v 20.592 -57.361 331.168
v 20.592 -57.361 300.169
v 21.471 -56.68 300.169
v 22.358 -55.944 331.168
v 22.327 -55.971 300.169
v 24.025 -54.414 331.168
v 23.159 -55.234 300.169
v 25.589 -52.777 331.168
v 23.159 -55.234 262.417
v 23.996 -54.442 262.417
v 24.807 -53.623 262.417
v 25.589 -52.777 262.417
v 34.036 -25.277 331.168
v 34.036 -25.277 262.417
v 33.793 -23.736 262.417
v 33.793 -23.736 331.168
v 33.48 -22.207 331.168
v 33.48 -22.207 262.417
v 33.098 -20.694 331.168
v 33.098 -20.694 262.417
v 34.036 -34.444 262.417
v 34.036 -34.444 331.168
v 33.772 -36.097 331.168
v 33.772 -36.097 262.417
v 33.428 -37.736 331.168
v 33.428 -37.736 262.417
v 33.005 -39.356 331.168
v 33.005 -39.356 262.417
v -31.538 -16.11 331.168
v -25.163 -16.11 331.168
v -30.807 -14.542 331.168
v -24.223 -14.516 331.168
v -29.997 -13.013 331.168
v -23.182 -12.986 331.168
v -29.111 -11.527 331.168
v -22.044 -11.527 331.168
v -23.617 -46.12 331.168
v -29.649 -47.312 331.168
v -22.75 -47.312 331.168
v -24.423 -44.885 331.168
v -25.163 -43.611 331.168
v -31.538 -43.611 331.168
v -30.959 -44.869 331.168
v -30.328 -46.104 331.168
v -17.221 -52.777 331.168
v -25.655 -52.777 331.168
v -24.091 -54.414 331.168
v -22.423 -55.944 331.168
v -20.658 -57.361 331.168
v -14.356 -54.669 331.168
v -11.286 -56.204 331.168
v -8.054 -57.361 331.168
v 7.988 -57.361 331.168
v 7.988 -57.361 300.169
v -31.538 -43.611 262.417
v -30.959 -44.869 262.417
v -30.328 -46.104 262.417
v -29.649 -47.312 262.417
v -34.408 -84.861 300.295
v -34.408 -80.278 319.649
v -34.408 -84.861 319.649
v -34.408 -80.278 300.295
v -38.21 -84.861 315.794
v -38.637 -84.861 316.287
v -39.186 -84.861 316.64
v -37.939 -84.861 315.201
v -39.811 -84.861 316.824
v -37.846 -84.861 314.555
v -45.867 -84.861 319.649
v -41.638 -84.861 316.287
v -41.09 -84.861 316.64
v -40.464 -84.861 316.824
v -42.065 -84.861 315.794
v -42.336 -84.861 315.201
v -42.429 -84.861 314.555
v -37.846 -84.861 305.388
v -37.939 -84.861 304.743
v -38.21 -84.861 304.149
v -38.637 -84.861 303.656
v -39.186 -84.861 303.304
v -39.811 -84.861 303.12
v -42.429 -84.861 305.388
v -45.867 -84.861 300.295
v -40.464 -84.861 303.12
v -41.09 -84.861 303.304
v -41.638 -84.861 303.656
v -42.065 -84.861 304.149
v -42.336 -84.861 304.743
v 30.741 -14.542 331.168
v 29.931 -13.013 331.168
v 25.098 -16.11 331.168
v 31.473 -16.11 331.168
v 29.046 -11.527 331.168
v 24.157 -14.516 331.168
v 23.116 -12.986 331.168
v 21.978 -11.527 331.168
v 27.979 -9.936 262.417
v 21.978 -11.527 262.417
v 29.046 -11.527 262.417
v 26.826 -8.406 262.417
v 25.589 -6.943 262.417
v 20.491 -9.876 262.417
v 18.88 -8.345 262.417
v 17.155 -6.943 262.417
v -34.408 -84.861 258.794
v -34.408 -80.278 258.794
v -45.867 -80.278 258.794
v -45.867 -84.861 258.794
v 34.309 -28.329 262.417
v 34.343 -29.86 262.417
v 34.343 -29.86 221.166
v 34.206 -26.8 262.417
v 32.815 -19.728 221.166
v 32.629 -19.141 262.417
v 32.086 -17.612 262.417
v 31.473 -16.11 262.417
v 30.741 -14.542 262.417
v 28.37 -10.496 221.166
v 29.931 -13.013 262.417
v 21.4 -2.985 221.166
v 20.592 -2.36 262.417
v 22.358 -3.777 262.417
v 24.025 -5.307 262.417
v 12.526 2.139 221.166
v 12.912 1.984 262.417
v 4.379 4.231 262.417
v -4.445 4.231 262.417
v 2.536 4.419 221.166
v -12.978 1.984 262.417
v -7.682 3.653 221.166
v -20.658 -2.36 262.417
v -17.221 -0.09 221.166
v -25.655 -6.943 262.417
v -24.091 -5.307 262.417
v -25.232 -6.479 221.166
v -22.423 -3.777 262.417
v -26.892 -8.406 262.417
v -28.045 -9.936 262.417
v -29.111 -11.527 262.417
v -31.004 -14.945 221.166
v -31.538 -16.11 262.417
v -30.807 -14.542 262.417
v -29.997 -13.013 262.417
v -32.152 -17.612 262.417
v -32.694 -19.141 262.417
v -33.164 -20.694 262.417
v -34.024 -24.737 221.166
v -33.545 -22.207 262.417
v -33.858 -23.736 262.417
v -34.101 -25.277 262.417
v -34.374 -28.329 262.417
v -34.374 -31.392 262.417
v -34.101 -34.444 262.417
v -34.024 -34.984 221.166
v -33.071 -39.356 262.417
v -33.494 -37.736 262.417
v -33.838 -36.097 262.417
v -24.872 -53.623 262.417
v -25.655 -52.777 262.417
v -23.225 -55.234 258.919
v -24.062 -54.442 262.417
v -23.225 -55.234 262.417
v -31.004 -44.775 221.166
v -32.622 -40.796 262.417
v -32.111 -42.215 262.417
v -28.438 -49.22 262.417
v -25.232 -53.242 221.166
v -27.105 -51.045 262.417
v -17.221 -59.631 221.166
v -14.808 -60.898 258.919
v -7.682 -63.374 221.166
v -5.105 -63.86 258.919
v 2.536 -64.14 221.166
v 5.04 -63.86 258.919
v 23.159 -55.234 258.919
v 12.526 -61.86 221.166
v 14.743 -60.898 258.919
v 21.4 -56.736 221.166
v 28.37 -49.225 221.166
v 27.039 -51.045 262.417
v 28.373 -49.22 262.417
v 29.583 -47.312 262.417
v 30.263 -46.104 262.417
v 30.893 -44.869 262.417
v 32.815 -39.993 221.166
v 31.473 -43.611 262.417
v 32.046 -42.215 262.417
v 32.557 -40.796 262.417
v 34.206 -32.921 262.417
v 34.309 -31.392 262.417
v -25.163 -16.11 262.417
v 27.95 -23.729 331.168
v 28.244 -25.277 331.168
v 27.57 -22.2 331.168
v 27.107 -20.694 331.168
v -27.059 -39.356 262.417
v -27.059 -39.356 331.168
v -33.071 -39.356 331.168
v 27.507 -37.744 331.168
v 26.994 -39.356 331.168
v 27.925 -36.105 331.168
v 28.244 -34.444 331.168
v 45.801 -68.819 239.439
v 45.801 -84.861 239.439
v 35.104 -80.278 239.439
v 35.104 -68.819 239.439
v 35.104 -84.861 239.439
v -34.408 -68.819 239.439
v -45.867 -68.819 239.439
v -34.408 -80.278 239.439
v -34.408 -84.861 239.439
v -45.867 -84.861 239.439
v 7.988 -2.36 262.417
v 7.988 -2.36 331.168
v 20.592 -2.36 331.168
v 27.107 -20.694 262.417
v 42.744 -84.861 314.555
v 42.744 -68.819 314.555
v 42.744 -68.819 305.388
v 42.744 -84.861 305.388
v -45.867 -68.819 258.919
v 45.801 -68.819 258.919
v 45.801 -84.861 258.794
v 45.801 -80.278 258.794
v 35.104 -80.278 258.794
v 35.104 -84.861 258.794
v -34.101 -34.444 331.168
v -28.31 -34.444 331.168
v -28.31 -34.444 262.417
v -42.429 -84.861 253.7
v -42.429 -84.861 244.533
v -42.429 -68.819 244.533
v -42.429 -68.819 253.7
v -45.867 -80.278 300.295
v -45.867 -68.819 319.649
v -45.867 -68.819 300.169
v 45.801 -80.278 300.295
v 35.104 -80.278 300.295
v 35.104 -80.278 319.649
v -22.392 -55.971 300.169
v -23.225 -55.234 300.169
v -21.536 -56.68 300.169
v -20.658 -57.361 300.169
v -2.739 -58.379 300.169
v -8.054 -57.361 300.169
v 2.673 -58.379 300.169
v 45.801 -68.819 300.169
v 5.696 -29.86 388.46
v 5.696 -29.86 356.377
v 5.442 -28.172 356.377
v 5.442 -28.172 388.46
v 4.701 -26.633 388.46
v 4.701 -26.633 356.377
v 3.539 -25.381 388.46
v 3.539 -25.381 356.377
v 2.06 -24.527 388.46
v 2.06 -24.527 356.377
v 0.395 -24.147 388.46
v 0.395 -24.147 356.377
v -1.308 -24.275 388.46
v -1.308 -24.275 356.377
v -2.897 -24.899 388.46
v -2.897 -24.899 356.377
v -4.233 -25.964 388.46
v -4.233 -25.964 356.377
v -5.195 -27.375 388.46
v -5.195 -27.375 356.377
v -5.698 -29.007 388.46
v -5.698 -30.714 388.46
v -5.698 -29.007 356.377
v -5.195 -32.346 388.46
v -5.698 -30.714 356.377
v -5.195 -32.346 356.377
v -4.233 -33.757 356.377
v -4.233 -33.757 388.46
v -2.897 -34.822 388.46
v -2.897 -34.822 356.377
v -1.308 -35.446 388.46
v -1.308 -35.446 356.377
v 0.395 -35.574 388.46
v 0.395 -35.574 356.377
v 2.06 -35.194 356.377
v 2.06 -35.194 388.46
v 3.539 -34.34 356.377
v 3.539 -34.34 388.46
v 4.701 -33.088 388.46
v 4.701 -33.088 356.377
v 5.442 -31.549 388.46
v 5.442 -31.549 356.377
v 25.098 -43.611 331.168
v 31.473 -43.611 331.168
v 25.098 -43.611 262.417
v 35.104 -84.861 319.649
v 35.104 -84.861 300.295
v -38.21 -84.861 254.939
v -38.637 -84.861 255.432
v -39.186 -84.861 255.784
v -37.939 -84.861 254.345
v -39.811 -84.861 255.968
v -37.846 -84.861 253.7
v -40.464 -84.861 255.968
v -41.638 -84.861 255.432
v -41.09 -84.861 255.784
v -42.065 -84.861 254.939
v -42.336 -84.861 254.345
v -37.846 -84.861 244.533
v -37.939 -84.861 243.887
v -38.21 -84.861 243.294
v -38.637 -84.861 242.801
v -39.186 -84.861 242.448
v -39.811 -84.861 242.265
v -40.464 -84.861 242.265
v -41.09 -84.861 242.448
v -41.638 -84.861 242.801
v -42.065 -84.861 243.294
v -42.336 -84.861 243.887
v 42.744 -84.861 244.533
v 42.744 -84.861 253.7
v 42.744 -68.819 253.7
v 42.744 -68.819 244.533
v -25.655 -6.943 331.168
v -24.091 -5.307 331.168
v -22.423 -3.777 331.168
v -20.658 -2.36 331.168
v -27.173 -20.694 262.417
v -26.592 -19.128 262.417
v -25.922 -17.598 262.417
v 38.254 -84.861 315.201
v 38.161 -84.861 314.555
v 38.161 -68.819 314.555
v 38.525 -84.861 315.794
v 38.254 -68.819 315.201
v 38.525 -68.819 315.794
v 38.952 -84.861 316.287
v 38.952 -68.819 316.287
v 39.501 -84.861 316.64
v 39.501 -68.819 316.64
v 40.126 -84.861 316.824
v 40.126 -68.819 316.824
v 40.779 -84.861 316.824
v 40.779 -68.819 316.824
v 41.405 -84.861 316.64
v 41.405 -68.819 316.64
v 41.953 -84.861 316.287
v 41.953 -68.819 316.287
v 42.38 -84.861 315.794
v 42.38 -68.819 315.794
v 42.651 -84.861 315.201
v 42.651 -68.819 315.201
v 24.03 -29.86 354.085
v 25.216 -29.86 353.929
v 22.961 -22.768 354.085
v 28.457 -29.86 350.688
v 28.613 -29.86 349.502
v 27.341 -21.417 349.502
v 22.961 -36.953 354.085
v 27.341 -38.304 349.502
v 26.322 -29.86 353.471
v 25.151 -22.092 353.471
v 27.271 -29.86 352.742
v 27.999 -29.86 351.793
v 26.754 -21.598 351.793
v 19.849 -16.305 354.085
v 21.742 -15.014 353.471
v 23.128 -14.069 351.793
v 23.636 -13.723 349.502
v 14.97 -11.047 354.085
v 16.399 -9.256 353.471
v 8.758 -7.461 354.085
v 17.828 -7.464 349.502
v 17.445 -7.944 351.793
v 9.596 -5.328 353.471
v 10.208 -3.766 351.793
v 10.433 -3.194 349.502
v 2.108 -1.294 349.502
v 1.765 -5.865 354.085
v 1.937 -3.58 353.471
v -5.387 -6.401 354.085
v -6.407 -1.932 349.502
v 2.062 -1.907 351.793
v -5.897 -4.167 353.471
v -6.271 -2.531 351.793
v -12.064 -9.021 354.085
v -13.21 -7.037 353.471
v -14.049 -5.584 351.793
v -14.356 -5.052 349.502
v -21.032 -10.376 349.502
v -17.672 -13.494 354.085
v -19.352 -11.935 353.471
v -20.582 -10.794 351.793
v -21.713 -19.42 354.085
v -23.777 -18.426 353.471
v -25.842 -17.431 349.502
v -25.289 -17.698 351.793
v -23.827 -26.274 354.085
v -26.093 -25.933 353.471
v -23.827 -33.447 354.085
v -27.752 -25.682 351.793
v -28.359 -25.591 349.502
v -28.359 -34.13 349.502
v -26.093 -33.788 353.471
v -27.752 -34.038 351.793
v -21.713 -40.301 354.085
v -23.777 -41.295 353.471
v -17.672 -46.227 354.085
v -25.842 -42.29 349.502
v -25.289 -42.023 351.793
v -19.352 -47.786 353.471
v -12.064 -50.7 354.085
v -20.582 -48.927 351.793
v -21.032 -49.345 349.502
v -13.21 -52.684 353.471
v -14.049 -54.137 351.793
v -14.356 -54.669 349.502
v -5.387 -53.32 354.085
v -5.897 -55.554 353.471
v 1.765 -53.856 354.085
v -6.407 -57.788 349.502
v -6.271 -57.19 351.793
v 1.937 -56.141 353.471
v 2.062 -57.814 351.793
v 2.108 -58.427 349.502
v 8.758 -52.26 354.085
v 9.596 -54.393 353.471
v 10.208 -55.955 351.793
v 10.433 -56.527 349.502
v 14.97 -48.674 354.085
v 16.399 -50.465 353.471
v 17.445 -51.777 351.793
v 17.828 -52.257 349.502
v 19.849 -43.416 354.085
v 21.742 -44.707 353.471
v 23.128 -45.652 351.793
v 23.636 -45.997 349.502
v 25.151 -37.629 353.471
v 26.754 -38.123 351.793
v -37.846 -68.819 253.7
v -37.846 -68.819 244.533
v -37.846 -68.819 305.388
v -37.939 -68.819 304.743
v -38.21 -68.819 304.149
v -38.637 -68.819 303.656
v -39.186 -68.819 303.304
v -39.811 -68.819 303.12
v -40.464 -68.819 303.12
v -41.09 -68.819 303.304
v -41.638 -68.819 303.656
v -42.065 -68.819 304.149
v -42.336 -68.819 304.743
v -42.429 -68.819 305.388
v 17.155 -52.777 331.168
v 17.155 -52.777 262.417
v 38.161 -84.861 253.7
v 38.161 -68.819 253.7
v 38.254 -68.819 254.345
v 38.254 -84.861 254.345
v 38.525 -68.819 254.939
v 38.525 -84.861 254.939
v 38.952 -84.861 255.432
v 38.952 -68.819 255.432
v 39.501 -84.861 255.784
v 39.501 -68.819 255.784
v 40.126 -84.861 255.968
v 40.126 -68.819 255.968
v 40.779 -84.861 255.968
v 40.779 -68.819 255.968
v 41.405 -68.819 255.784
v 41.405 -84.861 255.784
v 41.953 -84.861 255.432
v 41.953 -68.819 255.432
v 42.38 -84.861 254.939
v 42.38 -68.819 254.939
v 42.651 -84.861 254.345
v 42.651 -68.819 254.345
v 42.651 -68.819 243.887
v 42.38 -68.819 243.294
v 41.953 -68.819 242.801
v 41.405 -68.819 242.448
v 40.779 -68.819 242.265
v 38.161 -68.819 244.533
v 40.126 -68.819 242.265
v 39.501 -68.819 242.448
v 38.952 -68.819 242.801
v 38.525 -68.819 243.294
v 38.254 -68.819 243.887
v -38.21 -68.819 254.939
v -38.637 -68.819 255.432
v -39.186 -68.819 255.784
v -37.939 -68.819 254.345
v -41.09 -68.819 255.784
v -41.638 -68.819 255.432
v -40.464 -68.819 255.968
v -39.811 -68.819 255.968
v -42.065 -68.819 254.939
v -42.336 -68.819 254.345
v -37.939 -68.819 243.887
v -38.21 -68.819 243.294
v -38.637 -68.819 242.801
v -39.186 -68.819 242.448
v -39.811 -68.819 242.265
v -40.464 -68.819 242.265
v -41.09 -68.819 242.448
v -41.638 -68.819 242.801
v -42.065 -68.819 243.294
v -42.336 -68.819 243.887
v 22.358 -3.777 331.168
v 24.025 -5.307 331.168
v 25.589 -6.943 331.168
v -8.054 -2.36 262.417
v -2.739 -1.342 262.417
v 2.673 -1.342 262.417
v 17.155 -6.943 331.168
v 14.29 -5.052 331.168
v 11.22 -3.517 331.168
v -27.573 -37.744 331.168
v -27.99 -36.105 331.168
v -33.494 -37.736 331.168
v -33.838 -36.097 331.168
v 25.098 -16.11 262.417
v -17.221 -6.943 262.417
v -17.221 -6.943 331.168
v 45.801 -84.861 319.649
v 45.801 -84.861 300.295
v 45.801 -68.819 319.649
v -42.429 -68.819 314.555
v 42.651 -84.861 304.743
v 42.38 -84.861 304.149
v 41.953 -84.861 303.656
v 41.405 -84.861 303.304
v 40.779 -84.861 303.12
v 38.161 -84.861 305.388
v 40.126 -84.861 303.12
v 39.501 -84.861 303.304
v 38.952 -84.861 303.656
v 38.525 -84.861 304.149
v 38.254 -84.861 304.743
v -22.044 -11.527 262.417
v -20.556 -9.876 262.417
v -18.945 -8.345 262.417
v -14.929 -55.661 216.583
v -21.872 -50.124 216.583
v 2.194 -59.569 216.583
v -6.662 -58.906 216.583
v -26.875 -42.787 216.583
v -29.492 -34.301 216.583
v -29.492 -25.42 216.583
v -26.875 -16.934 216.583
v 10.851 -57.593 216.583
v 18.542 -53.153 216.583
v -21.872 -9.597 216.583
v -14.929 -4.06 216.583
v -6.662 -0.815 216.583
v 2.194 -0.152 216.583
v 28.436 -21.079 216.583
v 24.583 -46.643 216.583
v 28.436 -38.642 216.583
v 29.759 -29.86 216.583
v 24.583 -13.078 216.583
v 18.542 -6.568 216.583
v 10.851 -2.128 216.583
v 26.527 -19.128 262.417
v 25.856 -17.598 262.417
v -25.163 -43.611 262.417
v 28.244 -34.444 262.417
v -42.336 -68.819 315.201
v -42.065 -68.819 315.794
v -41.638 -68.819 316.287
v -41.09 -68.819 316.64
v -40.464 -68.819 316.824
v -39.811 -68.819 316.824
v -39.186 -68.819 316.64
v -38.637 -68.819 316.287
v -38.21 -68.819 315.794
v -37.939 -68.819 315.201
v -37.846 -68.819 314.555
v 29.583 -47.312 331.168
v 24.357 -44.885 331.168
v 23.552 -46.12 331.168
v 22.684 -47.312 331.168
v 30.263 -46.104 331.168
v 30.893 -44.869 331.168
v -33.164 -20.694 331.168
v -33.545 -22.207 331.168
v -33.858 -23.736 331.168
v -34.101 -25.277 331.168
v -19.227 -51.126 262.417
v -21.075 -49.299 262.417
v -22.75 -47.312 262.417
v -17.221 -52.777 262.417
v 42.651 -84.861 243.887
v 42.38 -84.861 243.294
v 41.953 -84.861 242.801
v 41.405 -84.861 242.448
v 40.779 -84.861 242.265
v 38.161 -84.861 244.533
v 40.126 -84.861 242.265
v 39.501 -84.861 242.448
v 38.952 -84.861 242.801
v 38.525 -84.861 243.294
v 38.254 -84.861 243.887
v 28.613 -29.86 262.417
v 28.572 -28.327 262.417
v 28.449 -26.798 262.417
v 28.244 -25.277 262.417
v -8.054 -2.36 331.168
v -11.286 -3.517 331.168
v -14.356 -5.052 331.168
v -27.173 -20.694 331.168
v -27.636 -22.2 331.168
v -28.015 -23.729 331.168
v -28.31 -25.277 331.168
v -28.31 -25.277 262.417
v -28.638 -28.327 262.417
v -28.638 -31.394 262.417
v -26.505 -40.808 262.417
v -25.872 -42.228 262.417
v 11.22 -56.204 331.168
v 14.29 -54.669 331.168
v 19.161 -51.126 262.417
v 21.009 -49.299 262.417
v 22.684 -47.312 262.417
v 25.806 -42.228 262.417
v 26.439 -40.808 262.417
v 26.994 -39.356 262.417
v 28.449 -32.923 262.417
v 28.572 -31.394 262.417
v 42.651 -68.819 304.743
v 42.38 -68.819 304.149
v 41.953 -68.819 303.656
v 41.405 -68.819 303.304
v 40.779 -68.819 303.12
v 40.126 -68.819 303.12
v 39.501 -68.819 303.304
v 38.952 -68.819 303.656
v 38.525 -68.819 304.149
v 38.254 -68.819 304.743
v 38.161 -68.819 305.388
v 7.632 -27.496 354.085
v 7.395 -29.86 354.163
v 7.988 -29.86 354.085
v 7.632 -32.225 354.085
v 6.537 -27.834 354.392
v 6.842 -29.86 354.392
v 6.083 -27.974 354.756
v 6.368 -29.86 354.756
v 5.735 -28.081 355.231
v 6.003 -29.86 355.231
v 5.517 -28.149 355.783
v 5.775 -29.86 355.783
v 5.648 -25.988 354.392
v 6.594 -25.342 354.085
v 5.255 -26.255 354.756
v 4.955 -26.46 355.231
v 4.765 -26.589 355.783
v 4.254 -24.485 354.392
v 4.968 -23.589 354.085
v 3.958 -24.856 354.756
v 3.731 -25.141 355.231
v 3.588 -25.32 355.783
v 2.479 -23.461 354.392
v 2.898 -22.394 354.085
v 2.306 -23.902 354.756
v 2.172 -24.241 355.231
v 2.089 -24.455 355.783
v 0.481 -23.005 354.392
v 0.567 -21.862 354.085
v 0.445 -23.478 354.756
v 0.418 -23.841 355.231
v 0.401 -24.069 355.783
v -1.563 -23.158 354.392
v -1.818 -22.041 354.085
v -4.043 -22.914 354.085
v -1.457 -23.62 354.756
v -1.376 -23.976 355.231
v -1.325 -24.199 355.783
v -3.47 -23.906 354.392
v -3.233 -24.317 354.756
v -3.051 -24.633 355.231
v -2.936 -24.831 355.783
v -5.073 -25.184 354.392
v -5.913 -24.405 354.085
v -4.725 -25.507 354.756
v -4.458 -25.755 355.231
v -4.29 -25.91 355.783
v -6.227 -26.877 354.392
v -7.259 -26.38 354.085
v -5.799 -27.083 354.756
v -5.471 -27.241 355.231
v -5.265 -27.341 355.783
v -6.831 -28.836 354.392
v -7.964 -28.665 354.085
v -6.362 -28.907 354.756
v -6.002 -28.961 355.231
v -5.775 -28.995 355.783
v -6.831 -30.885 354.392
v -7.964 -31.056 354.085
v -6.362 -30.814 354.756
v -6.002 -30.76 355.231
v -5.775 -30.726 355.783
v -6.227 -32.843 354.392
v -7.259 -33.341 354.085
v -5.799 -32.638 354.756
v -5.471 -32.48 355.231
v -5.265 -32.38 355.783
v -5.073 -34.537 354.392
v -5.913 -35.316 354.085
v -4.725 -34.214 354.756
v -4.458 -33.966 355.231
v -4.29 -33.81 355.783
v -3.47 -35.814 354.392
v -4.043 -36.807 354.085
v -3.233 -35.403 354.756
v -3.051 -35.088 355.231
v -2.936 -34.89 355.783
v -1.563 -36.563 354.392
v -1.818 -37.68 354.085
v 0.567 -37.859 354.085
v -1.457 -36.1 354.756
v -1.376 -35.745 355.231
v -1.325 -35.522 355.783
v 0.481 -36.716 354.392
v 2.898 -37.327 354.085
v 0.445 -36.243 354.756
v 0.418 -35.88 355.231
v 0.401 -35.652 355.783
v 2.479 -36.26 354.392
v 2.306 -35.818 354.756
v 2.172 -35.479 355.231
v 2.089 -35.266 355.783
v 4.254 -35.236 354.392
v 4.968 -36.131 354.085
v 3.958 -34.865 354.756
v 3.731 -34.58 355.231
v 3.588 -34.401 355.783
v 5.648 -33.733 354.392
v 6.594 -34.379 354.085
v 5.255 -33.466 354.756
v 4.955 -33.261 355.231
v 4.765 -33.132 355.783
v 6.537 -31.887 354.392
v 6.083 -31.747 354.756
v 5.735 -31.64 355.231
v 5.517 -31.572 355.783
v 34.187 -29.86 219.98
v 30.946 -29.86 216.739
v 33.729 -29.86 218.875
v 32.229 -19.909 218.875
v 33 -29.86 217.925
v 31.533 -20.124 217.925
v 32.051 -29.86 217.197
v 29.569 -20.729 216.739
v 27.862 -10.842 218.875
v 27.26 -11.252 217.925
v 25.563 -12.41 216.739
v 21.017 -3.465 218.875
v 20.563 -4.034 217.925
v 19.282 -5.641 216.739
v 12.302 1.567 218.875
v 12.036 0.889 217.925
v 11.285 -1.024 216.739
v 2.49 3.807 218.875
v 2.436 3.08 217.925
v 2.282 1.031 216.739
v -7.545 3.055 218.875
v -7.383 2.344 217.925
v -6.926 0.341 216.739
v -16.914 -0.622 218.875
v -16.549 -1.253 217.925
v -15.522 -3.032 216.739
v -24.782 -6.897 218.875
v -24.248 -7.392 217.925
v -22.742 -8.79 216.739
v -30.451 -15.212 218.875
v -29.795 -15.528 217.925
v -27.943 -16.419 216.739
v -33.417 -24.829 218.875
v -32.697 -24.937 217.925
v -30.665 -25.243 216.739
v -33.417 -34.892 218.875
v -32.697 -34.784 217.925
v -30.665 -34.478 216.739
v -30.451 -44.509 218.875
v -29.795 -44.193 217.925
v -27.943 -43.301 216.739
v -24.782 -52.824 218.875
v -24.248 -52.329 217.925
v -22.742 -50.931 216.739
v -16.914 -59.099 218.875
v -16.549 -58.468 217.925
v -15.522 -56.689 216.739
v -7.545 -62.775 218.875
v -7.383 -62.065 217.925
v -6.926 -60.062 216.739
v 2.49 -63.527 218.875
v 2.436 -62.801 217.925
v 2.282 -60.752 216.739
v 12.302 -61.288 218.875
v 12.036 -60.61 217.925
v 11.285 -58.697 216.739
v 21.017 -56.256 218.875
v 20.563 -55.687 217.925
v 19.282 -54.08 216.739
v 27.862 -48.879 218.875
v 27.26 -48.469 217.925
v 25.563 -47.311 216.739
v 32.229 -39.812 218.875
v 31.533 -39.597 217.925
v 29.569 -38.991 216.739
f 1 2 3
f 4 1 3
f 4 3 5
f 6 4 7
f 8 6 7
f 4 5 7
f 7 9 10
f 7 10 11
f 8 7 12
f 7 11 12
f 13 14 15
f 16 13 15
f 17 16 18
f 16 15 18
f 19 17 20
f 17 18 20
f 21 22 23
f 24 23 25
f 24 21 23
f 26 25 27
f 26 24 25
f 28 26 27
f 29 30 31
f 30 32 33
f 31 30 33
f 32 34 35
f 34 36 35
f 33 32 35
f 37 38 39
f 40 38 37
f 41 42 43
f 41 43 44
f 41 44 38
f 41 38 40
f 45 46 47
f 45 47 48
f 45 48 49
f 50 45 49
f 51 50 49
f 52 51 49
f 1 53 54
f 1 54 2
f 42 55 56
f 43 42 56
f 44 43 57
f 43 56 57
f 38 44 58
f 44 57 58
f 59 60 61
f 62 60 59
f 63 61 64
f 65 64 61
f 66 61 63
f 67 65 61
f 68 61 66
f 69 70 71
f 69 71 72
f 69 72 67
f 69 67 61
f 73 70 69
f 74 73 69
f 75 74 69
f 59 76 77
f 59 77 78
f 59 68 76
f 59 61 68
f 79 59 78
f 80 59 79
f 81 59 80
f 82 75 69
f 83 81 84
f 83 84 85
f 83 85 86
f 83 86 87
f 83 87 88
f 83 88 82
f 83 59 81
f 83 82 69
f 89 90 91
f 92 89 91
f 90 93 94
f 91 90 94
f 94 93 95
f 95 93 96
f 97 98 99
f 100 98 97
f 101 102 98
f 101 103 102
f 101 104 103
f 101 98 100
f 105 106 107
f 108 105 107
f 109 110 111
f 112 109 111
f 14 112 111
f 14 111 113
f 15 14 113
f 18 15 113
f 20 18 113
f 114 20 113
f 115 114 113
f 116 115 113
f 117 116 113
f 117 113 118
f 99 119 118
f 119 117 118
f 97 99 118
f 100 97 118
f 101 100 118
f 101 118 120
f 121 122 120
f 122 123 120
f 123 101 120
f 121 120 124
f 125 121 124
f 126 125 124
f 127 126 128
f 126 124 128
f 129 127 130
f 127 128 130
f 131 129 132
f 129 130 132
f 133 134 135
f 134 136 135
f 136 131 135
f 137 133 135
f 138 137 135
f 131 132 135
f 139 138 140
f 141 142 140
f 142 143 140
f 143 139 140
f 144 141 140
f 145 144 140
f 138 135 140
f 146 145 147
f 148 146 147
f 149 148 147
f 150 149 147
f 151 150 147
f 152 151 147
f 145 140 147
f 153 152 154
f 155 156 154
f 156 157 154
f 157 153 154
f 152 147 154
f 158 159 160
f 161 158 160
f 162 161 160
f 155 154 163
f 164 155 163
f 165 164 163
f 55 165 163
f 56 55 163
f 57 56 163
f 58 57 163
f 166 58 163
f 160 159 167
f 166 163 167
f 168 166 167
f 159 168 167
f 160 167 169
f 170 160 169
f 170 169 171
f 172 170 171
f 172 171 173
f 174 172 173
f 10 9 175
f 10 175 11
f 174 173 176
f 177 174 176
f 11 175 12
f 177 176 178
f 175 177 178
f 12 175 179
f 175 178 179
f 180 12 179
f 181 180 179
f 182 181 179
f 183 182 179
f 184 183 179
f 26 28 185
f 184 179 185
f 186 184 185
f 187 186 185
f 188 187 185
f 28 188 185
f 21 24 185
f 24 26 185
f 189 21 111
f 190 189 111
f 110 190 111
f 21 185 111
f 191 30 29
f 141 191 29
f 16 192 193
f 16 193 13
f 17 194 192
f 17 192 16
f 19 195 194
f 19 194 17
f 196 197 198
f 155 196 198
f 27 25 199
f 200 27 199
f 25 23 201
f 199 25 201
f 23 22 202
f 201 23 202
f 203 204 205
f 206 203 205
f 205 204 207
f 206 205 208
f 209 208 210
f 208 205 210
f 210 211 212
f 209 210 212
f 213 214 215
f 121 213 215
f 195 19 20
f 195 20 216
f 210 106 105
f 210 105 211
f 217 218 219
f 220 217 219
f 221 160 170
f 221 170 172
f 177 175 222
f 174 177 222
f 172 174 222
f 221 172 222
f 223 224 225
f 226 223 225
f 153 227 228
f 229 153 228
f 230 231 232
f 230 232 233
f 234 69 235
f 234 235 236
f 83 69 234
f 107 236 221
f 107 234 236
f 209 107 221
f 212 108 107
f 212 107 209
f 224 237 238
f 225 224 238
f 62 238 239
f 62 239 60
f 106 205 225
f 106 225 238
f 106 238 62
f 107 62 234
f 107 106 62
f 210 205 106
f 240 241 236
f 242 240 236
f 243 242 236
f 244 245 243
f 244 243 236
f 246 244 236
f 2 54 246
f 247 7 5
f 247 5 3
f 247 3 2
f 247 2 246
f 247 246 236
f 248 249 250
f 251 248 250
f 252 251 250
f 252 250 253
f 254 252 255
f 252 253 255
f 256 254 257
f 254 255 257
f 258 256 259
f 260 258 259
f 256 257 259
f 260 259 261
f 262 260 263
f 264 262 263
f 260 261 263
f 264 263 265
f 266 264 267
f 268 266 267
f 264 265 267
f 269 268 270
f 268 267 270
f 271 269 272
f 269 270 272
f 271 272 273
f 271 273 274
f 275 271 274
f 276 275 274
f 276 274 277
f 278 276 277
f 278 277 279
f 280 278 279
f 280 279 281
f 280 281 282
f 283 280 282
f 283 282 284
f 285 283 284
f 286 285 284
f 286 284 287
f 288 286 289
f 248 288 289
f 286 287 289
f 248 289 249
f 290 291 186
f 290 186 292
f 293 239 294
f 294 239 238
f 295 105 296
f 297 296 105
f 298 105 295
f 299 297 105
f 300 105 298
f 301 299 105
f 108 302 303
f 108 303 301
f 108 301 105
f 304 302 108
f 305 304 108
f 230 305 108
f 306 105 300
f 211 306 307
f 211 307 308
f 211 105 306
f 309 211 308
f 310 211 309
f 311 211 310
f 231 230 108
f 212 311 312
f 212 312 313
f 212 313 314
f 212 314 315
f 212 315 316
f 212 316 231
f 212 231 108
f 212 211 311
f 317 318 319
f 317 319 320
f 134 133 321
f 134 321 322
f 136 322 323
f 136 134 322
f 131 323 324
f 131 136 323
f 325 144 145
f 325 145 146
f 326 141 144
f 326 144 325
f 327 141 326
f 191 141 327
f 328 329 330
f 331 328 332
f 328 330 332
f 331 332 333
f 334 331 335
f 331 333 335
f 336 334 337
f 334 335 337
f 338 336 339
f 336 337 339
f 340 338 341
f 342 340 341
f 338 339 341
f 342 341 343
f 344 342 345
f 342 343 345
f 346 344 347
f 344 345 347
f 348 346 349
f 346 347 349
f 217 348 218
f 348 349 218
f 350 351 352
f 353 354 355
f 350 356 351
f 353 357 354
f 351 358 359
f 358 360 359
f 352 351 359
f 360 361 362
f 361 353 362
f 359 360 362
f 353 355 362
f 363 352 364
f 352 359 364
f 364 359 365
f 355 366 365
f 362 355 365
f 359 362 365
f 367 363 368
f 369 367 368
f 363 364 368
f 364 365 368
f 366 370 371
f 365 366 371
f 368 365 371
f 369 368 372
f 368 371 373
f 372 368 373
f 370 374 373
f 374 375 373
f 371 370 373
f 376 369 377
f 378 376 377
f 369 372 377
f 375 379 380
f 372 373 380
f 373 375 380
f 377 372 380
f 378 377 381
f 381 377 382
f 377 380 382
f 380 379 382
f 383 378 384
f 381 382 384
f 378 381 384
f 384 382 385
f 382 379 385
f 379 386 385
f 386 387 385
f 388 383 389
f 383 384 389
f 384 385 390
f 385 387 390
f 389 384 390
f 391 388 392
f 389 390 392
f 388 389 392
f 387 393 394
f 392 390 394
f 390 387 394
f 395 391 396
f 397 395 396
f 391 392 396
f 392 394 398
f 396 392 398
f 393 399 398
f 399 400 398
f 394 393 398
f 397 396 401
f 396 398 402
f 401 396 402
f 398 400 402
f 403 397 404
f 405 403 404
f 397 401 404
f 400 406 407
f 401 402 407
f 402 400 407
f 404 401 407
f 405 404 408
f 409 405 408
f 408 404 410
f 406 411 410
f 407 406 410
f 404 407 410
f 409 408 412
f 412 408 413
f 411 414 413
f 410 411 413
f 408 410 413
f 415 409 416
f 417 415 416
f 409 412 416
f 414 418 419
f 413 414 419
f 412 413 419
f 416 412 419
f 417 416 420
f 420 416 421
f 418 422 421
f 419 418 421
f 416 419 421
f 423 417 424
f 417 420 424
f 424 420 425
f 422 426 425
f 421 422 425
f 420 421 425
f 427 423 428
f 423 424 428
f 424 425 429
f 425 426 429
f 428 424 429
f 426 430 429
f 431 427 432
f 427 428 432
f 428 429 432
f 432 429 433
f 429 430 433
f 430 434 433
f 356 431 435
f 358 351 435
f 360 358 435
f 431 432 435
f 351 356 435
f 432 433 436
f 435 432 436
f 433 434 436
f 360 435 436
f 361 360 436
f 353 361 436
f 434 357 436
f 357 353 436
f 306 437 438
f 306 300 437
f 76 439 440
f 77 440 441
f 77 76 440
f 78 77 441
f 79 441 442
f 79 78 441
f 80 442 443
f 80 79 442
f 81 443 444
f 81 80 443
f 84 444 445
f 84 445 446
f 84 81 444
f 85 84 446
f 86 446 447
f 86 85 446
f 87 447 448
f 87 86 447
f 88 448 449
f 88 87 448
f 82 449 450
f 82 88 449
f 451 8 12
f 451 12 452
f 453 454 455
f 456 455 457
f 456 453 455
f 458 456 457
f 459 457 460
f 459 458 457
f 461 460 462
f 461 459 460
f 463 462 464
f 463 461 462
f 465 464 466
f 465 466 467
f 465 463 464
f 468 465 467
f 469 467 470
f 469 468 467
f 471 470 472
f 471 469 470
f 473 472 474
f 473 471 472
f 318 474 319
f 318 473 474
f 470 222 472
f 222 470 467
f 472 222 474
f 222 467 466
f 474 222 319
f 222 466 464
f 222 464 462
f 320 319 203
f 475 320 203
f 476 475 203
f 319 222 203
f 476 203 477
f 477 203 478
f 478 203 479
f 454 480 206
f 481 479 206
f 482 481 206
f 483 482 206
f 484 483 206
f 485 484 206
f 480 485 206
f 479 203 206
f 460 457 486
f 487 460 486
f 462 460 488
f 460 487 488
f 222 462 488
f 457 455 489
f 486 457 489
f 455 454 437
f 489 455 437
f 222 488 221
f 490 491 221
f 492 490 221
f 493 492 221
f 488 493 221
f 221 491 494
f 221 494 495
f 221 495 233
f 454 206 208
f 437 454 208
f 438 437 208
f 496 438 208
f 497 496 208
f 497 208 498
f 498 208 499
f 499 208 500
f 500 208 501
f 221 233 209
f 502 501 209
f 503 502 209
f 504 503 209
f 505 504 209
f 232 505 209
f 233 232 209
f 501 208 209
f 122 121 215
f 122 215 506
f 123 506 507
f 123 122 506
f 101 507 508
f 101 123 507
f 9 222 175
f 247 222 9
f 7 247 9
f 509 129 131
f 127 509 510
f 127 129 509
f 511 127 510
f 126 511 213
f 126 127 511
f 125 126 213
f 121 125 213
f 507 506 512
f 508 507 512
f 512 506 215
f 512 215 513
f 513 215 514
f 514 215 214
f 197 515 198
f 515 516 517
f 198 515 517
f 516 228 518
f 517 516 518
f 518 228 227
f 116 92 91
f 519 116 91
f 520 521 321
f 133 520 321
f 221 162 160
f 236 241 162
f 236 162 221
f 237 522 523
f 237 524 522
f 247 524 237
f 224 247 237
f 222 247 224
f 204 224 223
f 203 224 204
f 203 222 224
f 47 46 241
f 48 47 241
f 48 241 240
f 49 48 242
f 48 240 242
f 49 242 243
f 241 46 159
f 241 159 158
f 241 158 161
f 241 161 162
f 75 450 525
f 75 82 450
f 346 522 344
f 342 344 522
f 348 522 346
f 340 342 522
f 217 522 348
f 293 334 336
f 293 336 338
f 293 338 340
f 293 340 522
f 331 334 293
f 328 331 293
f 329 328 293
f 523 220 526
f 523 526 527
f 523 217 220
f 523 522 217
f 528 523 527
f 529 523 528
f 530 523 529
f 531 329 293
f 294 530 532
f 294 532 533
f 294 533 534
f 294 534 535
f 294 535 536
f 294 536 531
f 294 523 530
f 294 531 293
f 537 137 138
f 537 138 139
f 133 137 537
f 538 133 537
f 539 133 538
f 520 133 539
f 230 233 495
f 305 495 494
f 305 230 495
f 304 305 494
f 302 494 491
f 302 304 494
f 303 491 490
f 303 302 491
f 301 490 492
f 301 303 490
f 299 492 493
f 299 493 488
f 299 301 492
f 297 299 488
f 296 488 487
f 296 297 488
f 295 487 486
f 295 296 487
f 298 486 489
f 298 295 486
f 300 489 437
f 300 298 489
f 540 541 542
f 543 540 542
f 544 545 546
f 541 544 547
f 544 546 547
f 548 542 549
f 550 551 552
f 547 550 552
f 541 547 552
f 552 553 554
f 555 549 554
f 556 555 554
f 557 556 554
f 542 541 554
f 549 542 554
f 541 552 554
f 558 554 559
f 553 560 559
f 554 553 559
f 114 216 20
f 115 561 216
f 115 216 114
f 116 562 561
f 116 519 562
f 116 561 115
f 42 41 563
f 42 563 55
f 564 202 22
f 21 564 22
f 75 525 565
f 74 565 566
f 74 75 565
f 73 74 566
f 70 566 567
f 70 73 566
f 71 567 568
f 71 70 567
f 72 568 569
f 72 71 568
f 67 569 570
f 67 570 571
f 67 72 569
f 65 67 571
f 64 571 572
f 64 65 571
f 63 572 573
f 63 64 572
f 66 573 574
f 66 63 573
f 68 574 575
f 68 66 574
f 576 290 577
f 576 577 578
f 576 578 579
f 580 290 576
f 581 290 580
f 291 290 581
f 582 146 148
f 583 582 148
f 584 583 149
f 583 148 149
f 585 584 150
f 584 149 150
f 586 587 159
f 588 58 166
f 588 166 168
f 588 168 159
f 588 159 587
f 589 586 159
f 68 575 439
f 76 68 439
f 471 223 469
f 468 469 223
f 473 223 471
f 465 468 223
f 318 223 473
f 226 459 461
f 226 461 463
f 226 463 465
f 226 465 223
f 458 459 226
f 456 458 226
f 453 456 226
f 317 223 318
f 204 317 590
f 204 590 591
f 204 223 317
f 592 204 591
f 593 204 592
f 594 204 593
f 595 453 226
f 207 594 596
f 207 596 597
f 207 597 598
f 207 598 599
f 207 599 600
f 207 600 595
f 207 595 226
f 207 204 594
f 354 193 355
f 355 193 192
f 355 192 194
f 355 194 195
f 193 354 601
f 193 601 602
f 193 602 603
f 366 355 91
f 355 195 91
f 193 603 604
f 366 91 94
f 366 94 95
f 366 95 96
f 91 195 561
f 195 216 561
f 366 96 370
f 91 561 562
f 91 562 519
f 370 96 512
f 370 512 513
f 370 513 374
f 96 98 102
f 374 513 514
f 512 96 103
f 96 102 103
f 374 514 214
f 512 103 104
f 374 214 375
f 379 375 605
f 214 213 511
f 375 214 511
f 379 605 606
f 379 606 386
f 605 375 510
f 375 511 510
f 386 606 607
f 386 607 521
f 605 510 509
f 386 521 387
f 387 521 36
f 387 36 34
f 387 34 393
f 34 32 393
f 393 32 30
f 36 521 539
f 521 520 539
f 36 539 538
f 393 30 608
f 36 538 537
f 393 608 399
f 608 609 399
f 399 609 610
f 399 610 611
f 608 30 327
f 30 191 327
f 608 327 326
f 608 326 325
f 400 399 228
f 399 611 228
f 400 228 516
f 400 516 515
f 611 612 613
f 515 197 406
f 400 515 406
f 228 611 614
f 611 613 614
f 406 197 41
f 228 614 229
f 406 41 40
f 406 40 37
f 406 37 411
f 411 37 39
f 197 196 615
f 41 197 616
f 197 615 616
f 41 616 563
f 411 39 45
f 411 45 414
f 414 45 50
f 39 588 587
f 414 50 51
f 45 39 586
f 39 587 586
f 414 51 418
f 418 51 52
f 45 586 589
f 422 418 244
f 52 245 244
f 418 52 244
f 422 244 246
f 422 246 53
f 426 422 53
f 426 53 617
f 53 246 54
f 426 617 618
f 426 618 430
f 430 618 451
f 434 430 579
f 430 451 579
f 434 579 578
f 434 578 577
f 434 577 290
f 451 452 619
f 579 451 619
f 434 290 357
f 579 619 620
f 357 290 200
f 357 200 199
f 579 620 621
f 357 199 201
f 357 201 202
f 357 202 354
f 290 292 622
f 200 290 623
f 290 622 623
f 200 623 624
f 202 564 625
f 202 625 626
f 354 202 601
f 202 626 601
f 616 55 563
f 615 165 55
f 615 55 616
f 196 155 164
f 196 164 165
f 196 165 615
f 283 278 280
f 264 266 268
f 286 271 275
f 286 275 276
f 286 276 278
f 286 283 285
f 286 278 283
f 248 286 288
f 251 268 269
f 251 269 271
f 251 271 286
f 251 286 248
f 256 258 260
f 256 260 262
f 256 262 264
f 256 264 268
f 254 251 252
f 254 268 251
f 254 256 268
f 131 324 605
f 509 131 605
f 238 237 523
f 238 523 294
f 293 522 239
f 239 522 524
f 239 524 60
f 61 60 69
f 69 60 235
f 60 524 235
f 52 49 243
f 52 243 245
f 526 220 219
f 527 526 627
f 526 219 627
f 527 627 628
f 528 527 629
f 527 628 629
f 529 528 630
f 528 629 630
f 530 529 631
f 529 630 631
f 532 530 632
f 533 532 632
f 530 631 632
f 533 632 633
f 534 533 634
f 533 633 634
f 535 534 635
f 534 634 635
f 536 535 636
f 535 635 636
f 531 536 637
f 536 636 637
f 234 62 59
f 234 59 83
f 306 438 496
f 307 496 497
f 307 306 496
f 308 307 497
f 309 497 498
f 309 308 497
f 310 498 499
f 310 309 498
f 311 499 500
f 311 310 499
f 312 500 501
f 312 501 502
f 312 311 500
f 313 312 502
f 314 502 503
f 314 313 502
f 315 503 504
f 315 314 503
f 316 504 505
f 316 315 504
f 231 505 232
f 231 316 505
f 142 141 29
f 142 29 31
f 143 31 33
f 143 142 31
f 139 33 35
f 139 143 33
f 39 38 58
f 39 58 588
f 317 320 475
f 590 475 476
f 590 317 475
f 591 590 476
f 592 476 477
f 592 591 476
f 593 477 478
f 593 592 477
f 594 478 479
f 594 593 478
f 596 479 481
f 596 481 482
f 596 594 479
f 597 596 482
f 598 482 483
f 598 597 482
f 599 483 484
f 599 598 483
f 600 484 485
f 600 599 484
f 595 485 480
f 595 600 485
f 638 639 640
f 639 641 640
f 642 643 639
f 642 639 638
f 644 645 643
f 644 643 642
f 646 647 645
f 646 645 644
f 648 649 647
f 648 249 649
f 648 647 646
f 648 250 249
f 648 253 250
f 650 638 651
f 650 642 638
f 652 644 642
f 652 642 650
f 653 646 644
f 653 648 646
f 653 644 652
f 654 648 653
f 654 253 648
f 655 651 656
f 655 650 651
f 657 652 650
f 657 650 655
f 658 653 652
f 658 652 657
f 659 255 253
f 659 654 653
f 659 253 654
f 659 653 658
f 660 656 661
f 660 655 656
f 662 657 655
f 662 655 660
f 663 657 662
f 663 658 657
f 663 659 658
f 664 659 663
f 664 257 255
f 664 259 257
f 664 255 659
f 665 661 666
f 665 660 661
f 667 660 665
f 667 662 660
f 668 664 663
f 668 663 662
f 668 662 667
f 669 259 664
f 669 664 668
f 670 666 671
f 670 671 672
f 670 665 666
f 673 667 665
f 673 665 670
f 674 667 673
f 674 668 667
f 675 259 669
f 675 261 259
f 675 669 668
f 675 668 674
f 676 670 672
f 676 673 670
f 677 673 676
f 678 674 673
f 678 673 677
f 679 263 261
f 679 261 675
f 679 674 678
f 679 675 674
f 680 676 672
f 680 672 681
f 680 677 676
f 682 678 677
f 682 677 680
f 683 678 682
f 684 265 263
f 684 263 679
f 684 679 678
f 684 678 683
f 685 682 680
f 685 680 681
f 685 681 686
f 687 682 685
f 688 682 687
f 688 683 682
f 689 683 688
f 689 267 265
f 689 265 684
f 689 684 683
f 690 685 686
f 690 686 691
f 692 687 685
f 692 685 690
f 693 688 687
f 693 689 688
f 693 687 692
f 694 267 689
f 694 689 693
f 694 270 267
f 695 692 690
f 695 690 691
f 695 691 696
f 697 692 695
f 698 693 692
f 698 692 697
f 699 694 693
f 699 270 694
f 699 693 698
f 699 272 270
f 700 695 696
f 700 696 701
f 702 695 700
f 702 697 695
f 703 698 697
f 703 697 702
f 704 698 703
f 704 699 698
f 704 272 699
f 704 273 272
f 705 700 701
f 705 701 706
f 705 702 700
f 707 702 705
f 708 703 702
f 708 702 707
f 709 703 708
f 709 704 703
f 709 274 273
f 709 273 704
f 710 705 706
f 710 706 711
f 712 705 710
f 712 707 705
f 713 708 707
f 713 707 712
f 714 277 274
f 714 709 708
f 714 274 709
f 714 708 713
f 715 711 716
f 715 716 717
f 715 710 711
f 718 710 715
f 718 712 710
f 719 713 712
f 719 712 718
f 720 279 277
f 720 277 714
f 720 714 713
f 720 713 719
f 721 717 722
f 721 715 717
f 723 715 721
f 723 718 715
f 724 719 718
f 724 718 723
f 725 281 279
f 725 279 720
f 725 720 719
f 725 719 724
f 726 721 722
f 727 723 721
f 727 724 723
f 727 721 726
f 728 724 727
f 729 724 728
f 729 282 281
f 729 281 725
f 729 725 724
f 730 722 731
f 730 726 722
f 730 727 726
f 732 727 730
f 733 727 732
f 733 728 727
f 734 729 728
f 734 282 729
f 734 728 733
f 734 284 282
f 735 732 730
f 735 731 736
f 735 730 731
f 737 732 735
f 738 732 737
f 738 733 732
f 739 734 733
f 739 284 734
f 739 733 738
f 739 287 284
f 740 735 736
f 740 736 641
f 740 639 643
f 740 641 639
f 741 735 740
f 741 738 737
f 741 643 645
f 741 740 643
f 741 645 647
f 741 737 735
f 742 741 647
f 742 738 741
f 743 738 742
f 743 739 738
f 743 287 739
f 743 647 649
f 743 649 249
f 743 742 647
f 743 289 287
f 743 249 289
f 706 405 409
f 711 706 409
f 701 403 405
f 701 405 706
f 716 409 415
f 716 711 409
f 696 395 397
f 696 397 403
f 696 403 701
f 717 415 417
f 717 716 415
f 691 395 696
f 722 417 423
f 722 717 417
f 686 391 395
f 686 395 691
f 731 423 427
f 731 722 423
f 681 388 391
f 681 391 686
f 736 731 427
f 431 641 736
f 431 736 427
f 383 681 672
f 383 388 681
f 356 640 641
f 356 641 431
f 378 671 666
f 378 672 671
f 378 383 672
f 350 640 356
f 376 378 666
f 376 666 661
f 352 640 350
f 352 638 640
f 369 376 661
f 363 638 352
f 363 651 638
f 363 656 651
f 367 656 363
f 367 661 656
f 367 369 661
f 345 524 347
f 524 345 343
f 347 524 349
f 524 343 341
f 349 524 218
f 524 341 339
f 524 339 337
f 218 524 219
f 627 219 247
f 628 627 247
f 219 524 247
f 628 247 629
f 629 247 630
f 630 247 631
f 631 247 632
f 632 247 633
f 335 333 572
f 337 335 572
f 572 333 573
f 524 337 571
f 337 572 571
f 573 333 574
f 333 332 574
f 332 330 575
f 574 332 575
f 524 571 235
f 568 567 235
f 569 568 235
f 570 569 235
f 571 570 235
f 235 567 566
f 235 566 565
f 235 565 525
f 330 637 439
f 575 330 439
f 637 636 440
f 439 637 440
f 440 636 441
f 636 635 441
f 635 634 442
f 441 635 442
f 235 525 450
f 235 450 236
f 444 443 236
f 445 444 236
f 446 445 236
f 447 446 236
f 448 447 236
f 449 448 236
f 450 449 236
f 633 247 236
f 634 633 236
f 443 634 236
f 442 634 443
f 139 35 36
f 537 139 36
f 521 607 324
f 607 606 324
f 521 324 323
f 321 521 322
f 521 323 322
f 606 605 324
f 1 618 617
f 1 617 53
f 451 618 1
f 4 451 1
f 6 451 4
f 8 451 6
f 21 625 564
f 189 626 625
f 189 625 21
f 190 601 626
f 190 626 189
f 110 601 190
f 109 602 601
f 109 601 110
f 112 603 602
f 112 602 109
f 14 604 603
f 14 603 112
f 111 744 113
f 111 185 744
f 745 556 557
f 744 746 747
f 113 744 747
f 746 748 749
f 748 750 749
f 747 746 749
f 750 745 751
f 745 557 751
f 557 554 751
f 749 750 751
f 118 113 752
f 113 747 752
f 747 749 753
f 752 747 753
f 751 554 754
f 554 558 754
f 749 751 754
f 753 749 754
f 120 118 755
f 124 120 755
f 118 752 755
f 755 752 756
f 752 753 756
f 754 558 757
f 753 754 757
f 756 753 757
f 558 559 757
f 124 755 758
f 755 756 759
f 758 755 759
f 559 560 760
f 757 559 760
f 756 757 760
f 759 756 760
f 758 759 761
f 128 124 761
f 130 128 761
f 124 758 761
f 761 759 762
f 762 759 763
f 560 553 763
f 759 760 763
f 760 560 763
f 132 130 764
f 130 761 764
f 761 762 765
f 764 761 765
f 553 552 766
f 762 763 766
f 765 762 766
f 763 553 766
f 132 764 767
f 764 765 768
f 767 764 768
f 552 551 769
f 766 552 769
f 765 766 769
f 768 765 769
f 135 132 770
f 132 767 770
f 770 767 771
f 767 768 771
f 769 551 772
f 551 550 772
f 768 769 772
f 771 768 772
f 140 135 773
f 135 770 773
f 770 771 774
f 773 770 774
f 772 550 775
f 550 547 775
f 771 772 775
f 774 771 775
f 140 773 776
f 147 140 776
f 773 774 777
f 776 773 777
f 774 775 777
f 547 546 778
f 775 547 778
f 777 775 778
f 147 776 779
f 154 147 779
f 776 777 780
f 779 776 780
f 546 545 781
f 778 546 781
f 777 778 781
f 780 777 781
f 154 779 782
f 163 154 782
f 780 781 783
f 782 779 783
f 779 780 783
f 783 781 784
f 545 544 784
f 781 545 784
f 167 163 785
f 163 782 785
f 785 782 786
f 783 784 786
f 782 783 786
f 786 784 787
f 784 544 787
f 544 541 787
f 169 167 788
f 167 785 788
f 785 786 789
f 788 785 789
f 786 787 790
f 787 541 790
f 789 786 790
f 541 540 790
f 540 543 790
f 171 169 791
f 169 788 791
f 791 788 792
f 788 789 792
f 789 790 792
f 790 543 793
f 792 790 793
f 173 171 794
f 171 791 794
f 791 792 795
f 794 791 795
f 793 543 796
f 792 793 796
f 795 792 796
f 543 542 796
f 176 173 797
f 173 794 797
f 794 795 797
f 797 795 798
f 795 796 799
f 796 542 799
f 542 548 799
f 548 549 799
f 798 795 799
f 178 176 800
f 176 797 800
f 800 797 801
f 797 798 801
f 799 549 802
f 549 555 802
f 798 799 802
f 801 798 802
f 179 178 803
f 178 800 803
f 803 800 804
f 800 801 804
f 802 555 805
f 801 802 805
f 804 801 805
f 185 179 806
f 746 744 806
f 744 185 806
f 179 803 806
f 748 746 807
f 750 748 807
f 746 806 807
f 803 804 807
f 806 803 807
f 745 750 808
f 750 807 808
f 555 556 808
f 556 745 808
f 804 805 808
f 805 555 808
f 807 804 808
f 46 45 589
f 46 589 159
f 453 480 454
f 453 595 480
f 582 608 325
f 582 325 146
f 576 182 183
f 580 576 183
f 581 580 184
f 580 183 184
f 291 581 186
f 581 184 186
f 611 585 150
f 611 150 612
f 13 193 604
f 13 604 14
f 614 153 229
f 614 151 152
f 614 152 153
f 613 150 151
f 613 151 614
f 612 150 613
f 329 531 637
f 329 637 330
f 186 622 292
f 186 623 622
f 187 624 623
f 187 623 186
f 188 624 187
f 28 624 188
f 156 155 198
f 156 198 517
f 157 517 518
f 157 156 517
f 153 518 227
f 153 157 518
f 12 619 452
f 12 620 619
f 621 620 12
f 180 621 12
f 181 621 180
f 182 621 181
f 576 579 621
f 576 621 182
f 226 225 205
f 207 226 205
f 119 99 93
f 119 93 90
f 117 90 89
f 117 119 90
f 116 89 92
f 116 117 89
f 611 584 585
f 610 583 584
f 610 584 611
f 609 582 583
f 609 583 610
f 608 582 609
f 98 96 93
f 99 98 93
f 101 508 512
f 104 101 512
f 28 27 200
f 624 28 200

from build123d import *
from build123d.topology import SkipClean

# Parameters (mm, degrees)
SKETCH1_R            = 150
BOSS_EXTRUDE1_DEPTH  = 200
BOSS_EXTRUDE11_DEPTH = 300
BOSS_EXTRUDE14_START = -300
SKETCH12_R           = 125
BOSS_EXTRUDE14_DEPTH = 400
SKETCH13_W           = 46.677917496
SKETCH13_H           = 84.453402707
SKETCH13_H_2         = 84.453402706
SKETCH13_W_2         = 50
BOSS_EXTRUDE15_DEPTH = 50
SKETCH13_3_W         = 46.677917496
SKETCH13_3_H         = 84.453402706
SKETCH13_3_H_2       = 84.453402707
SKETCH13_3_W_2       = 50
BOSS_EXTRUDE16_DEPTH = 20
BOSS_EXTRUDE17_DEPTH = 90
SKETCH16_R           = 25
BOSS_EXTRUDE18_DEPTH = 150
FILLET2_R            = 10
FILLET3_R            = 20
SCALE4_SCALE         = 0.22917


with BuildPart() as part:
    # Sketch1 → Boss-Extrude1 (new body)
    with BuildSketch(Plane.XY):
        Circle(SKETCH1_R)
    extrude(amount=BOSS_EXTRUDE1_DEPTH)

    # Sketch7 → Boss-Extrude11 (add)
    with SkipClean():  # the faces are left unmerged after this step: merging them gives an invalid solid
        with BuildSketch(Plane.XY.offset(200)):
            with BuildLine():
                Line((-90, 120), (90, 120))
                ThreePointArc((90, 120), (101.396020382, 110.538893837), (111.803398875, 100))
                Line((111.803398875, 100), (-111.803398875, 100))
                ThreePointArc((-111.803398875, 100), (-101.396020382, 110.538893837), (-90, 120))
            make_face()
            with BuildLine():
                Line((-126.885775404, 80), (126.885775404, 80))
                ThreePointArc((126.885775404, 80), (132.559251115, 70.200035213), (137.477270849, 60))
                Line((137.477270849, 60), (-137.477270849, 60))
                ThreePointArc((-137.477270849, 60), (-132.559251115, 70.200035213), (-126.885775404, 80))
            make_face()
            with BuildLine():
                Line((144.16342013, -41.435592144), (-144.16342013, -41.435592144))
                ThreePointArc((-144.16342013, -41.435592144), (-146.803816882, -30.799989431), (-148.660687473, -20))
                Line((-148.660687473, -20), (148.660687473, -20))
                ThreePointArc((148.660687473, -20), (146.803816882, -30.799989431), (144.16342013, -41.435592144))
            make_face()
            with BuildLine():
                Line((111.803398875, -100), (-111.803398875, -100))
                ThreePointArc((-111.803398875, -100), (-101.396020382, -110.538893837), (-90, -120))
                Line((-90, -120), (90, -120))
                ThreePointArc((90, -120), (101.396020382, -110.538893837), (111.803398875, -100))
            make_face()
            with BuildLine():
                Line((144.568322948, 40), (-144.568322948, 40))
                ThreePointArc((-144.568322948, 40), (-146.955139883, 30.069700063), (-148.660687473, 20))
                Line((-148.660687473, 20), (148.660687473, 20))
                ThreePointArc((148.660687473, 20), (146.955139883, 30.069700063), (144.568322948, 40))
            make_face()
            with BuildLine():
                Line((137.477270849, -60), (-137.477270849, -60))
                ThreePointArc((-137.477270849, -60), (-133.599215205, -68.20007109), (-129.232599216, -76.150740639))
                Line((-129.232599216, -76.150740639), (129.232599216, -76.150740639))
                ThreePointArc((129.232599216, -76.150740639), (133.599215205, -68.20007109), (137.477270849, -60))
            make_face()
        extrude(amount=BOSS_EXTRUDE11_DEPTH)



with BuildPart() as body_2:
    # Sketch12 → Boss-Extrude14 (new body)
    with BuildSketch(Plane.XY.offset(500).offset(BOSS_EXTRUDE14_START)):
        Circle(SKETCH12_R)
    extrude(amount=BOSS_EXTRUDE14_DEPTH)


with BuildPart() as body_3:
    # Sketch13 → Boss-Extrude15 (new body)
    # profile 1 of 5: a face of its own
    with BuildSketch(Plane(origin=(0, -220, 0), x_dir=(-1, 0, 0), z_dir=(0, -1, 0))):
        Polygon((150, -99.735715433), (-153.322082504, -99.735715433), (-153.322082504, -184.18911814), (-200, -184.18911814), (-200, -365.282312727), (-153.322082504, -365.282312727), (-153.322082504, -449.735715433), (150, -449.735715433), (150, -365.282312727), (200, -365.282312727), (200, -184.18911814), (150, -184.18911814), align=None)
    # profile 2 of 5: a face of its own
    with BuildSketch(Plane(origin=(0, -220, 0), x_dir=(-1, 0, 0), z_dir=(0, -1, 0))):
        with Locations((-176.661041252, -141.962416787)):
            Rectangle(SKETCH13_W, SKETCH13_H)
        with BuildLine():
            ThreePointArc((-186.661041252, -121.962416787), (-176.661041252, -111.962416787), (-166.661041252, -121.962416787))
            Line((-166.661041252, -121.962416787), (-166.661041252, -161.962416787))
            ThreePointArc((-166.661041252, -161.962416787), (-176.661041252, -171.962416787), (-186.661041252, -161.962416787))
            Line((-186.661041252, -161.962416787), (-186.661041252, -121.962416787))
        make_face(mode=Mode.SUBTRACT)
    # profile 3 of 5: a face of its own
    with BuildSketch(Plane(origin=(0, -220, 0), x_dir=(-1, 0, 0), z_dir=(0, -1, 0))):
        with Locations((-176.661041252, -407.50901408)):
            Rectangle(SKETCH13_W, SKETCH13_H_2)
        with BuildLine():
            Line((-166.661041252, -387.50901408), (-166.661041252, -427.50901408))
            ThreePointArc((-166.661041252, -427.50901408), (-176.661041252, -437.50901408), (-186.661041252, -427.50901408))
            Line((-186.661041252, -427.50901408), (-186.661041252, -387.50901408))
            ThreePointArc((-186.661041252, -387.50901408), (-176.661041252, -377.50901408), (-166.661041252, -387.50901408))
        make_face(mode=Mode.SUBTRACT)
    # profile 4 of 5: a face of its own
    with BuildSketch(Plane(origin=(0, -220, 0), x_dir=(-1, 0, 0), z_dir=(0, -1, 0))):
        with Locations((175, -407.50901408)):
            Rectangle(SKETCH13_W_2, SKETCH13_H_2)
        with BuildLine():
            Line((185, -387.50901408), (185, -427.50901408))
            ThreePointArc((185, -427.50901408), (175, -437.50901408), (165, -427.50901408))
            Line((165, -427.50901408), (165, -387.50901408))
            ThreePointArc((165, -387.50901408), (175, -377.50901408), (185, -387.50901408))
        make_face(mode=Mode.SUBTRACT)
    # profile 5 of 5: a face of its own
    with BuildSketch(Plane(origin=(0, -220, 0), x_dir=(-1, 0, 0), z_dir=(0, -1, 0))):
        with Locations((175, -141.962416787)):
            Rectangle(SKETCH13_W_2, SKETCH13_H)
        with BuildLine():
            ThreePointArc((165, -121.962416787), (175, -111.962416787), (185, -121.962416787))
            Line((185, -121.962416787), (185, -161.962416787))
            ThreePointArc((185, -161.962416787), (175, -171.962416787), (165, -161.962416787))
            Line((165, -161.962416787), (165, -121.962416787))
        make_face(mode=Mode.SUBTRACT)
    extrude(amount=-BOSS_EXTRUDE15_DEPTH)

    # Sketch13<3> → Boss-Extrude16 (add)
    # profile 1 of 4: a face of its own
    with BuildSketch(Plane(origin=(0, -220, 0), x_dir=(-1, 0, 0), z_dir=(0, -1, 0))):
        with Locations((-176.661041252, -407.50901408)):
            Rectangle(SKETCH13_3_W, SKETCH13_3_H)
        with BuildLine():
            Line((-166.661041252, -387.50901408), (-166.661041252, -427.50901408))
            ThreePointArc((-166.661041252, -427.50901408), (-176.661041252, -437.50901408), (-186.661041252, -427.50901408))
            Line((-186.661041252, -427.50901408), (-186.661041252, -387.50901408))
            ThreePointArc((-186.661041252, -387.50901408), (-176.661041252, -377.50901408), (-166.661041252, -387.50901408))
        make_face(mode=Mode.SUBTRACT)
    # profile 2 of 4: a face of its own
    with BuildSketch(Plane(origin=(0, -220, 0), x_dir=(-1, 0, 0), z_dir=(0, -1, 0))):
        with Locations((-176.661041252, -141.962416787)):
            Rectangle(SKETCH13_3_W, SKETCH13_3_H_2)
        with BuildLine():
            ThreePointArc((-186.661041252, -121.962416787), (-176.661041252, -111.962416787), (-166.661041252, -121.962416787))
            Line((-166.661041252, -121.962416787), (-166.661041252, -161.962416787))
            ThreePointArc((-166.661041252, -161.962416787), (-176.661041252, -171.962416787), (-186.661041252, -161.962416787))
            Line((-186.661041252, -161.962416787), (-186.661041252, -121.962416787))
        make_face(mode=Mode.SUBTRACT)
    # profile 3 of 4: a face of its own
    with BuildSketch(Plane(origin=(0, -220, 0), x_dir=(-1, 0, 0), z_dir=(0, -1, 0))):
        with Locations((175, -407.50901408)):
            Rectangle(SKETCH13_3_W_2, SKETCH13_3_H)
        with BuildLine():
            Line((185, -387.50901408), (185, -427.50901408))
            ThreePointArc((185, -427.50901408), (175, -437.50901408), (165, -427.50901408))
            Line((165, -427.50901408), (165, -387.50901408))
            ThreePointArc((165, -387.50901408), (175, -377.50901408), (185, -387.50901408))
        make_face(mode=Mode.SUBTRACT)
    # profile 4 of 4: a face of its own
    with BuildSketch(Plane(origin=(0, -220, 0), x_dir=(-1, 0, 0), z_dir=(0, -1, 0))):
        with Locations((175, -141.962416787)):
            Rectangle(SKETCH13_3_W_2, SKETCH13_3_H_2)
        with BuildLine():
            ThreePointArc((165, -121.962416787), (175, -111.962416787), (185, -121.962416787))
            Line((185, -121.962416787), (185, -161.962416787))
            ThreePointArc((185, -161.962416787), (175, -171.962416787), (165, -161.962416787))
            Line((165, -161.962416787), (165, -121.962416787))
        make_face(mode=Mode.SUBTRACT)
    extrude(amount=BOSS_EXTRUDE16_DEPTH)


with BuildPart() as part_1:
    with SkipClean():  # the faces are left unmerged after this step: merging them gives an invalid solid
        add(part.part)

        add(body_2.part)  # Boss-Extrude17 merges body 2

        add(body_3.part)  # Boss-Extrude17 merges body 3
        # Sketch14 → Boss-Extrude17 (add, symmetric)
        with BuildSketch(Plane.XY.offset(274.735715433)):
            Polygon((-200, -170), (200, -170), (100, -110), (-100, -110), align=None)
        extrude(amount=BOSS_EXTRUDE17_DEPTH, both=True)

    # Sketch16 → Boss-Extrude18 (add)
    with BuildSketch(Plane.XY.offset(600)):
        Circle(SKETCH16_R)
    extrude(amount=BOSS_EXTRUDE18_DEPTH)

    # Fillet2
    fillet2_edges = [part_1.edges().sort_by_distance(p)[0] for p in [
        (-25, 0, 600),
    ]]
    fillet(fillet2_edges, radius=FILLET2_R)

    # Fillet3
    fillet3_edges = [part_1.edges().sort_by_distance(p)[0] for p in [
        (-125, 0, 600),
        (-150, 0, 0),
    ]]
    fillet(fillet3_edges, radius=FILLET3_R)


with BuildPart() as part_2:
    # Scale4: scaled about (-0.042581341, -38.738063296, 280.973660068)
    add(part_1.part.scale(SCALE4_SCALE).moved(Location((-0.032822975, -29.86046133, 216.58292639))))


solid = part_2.part
